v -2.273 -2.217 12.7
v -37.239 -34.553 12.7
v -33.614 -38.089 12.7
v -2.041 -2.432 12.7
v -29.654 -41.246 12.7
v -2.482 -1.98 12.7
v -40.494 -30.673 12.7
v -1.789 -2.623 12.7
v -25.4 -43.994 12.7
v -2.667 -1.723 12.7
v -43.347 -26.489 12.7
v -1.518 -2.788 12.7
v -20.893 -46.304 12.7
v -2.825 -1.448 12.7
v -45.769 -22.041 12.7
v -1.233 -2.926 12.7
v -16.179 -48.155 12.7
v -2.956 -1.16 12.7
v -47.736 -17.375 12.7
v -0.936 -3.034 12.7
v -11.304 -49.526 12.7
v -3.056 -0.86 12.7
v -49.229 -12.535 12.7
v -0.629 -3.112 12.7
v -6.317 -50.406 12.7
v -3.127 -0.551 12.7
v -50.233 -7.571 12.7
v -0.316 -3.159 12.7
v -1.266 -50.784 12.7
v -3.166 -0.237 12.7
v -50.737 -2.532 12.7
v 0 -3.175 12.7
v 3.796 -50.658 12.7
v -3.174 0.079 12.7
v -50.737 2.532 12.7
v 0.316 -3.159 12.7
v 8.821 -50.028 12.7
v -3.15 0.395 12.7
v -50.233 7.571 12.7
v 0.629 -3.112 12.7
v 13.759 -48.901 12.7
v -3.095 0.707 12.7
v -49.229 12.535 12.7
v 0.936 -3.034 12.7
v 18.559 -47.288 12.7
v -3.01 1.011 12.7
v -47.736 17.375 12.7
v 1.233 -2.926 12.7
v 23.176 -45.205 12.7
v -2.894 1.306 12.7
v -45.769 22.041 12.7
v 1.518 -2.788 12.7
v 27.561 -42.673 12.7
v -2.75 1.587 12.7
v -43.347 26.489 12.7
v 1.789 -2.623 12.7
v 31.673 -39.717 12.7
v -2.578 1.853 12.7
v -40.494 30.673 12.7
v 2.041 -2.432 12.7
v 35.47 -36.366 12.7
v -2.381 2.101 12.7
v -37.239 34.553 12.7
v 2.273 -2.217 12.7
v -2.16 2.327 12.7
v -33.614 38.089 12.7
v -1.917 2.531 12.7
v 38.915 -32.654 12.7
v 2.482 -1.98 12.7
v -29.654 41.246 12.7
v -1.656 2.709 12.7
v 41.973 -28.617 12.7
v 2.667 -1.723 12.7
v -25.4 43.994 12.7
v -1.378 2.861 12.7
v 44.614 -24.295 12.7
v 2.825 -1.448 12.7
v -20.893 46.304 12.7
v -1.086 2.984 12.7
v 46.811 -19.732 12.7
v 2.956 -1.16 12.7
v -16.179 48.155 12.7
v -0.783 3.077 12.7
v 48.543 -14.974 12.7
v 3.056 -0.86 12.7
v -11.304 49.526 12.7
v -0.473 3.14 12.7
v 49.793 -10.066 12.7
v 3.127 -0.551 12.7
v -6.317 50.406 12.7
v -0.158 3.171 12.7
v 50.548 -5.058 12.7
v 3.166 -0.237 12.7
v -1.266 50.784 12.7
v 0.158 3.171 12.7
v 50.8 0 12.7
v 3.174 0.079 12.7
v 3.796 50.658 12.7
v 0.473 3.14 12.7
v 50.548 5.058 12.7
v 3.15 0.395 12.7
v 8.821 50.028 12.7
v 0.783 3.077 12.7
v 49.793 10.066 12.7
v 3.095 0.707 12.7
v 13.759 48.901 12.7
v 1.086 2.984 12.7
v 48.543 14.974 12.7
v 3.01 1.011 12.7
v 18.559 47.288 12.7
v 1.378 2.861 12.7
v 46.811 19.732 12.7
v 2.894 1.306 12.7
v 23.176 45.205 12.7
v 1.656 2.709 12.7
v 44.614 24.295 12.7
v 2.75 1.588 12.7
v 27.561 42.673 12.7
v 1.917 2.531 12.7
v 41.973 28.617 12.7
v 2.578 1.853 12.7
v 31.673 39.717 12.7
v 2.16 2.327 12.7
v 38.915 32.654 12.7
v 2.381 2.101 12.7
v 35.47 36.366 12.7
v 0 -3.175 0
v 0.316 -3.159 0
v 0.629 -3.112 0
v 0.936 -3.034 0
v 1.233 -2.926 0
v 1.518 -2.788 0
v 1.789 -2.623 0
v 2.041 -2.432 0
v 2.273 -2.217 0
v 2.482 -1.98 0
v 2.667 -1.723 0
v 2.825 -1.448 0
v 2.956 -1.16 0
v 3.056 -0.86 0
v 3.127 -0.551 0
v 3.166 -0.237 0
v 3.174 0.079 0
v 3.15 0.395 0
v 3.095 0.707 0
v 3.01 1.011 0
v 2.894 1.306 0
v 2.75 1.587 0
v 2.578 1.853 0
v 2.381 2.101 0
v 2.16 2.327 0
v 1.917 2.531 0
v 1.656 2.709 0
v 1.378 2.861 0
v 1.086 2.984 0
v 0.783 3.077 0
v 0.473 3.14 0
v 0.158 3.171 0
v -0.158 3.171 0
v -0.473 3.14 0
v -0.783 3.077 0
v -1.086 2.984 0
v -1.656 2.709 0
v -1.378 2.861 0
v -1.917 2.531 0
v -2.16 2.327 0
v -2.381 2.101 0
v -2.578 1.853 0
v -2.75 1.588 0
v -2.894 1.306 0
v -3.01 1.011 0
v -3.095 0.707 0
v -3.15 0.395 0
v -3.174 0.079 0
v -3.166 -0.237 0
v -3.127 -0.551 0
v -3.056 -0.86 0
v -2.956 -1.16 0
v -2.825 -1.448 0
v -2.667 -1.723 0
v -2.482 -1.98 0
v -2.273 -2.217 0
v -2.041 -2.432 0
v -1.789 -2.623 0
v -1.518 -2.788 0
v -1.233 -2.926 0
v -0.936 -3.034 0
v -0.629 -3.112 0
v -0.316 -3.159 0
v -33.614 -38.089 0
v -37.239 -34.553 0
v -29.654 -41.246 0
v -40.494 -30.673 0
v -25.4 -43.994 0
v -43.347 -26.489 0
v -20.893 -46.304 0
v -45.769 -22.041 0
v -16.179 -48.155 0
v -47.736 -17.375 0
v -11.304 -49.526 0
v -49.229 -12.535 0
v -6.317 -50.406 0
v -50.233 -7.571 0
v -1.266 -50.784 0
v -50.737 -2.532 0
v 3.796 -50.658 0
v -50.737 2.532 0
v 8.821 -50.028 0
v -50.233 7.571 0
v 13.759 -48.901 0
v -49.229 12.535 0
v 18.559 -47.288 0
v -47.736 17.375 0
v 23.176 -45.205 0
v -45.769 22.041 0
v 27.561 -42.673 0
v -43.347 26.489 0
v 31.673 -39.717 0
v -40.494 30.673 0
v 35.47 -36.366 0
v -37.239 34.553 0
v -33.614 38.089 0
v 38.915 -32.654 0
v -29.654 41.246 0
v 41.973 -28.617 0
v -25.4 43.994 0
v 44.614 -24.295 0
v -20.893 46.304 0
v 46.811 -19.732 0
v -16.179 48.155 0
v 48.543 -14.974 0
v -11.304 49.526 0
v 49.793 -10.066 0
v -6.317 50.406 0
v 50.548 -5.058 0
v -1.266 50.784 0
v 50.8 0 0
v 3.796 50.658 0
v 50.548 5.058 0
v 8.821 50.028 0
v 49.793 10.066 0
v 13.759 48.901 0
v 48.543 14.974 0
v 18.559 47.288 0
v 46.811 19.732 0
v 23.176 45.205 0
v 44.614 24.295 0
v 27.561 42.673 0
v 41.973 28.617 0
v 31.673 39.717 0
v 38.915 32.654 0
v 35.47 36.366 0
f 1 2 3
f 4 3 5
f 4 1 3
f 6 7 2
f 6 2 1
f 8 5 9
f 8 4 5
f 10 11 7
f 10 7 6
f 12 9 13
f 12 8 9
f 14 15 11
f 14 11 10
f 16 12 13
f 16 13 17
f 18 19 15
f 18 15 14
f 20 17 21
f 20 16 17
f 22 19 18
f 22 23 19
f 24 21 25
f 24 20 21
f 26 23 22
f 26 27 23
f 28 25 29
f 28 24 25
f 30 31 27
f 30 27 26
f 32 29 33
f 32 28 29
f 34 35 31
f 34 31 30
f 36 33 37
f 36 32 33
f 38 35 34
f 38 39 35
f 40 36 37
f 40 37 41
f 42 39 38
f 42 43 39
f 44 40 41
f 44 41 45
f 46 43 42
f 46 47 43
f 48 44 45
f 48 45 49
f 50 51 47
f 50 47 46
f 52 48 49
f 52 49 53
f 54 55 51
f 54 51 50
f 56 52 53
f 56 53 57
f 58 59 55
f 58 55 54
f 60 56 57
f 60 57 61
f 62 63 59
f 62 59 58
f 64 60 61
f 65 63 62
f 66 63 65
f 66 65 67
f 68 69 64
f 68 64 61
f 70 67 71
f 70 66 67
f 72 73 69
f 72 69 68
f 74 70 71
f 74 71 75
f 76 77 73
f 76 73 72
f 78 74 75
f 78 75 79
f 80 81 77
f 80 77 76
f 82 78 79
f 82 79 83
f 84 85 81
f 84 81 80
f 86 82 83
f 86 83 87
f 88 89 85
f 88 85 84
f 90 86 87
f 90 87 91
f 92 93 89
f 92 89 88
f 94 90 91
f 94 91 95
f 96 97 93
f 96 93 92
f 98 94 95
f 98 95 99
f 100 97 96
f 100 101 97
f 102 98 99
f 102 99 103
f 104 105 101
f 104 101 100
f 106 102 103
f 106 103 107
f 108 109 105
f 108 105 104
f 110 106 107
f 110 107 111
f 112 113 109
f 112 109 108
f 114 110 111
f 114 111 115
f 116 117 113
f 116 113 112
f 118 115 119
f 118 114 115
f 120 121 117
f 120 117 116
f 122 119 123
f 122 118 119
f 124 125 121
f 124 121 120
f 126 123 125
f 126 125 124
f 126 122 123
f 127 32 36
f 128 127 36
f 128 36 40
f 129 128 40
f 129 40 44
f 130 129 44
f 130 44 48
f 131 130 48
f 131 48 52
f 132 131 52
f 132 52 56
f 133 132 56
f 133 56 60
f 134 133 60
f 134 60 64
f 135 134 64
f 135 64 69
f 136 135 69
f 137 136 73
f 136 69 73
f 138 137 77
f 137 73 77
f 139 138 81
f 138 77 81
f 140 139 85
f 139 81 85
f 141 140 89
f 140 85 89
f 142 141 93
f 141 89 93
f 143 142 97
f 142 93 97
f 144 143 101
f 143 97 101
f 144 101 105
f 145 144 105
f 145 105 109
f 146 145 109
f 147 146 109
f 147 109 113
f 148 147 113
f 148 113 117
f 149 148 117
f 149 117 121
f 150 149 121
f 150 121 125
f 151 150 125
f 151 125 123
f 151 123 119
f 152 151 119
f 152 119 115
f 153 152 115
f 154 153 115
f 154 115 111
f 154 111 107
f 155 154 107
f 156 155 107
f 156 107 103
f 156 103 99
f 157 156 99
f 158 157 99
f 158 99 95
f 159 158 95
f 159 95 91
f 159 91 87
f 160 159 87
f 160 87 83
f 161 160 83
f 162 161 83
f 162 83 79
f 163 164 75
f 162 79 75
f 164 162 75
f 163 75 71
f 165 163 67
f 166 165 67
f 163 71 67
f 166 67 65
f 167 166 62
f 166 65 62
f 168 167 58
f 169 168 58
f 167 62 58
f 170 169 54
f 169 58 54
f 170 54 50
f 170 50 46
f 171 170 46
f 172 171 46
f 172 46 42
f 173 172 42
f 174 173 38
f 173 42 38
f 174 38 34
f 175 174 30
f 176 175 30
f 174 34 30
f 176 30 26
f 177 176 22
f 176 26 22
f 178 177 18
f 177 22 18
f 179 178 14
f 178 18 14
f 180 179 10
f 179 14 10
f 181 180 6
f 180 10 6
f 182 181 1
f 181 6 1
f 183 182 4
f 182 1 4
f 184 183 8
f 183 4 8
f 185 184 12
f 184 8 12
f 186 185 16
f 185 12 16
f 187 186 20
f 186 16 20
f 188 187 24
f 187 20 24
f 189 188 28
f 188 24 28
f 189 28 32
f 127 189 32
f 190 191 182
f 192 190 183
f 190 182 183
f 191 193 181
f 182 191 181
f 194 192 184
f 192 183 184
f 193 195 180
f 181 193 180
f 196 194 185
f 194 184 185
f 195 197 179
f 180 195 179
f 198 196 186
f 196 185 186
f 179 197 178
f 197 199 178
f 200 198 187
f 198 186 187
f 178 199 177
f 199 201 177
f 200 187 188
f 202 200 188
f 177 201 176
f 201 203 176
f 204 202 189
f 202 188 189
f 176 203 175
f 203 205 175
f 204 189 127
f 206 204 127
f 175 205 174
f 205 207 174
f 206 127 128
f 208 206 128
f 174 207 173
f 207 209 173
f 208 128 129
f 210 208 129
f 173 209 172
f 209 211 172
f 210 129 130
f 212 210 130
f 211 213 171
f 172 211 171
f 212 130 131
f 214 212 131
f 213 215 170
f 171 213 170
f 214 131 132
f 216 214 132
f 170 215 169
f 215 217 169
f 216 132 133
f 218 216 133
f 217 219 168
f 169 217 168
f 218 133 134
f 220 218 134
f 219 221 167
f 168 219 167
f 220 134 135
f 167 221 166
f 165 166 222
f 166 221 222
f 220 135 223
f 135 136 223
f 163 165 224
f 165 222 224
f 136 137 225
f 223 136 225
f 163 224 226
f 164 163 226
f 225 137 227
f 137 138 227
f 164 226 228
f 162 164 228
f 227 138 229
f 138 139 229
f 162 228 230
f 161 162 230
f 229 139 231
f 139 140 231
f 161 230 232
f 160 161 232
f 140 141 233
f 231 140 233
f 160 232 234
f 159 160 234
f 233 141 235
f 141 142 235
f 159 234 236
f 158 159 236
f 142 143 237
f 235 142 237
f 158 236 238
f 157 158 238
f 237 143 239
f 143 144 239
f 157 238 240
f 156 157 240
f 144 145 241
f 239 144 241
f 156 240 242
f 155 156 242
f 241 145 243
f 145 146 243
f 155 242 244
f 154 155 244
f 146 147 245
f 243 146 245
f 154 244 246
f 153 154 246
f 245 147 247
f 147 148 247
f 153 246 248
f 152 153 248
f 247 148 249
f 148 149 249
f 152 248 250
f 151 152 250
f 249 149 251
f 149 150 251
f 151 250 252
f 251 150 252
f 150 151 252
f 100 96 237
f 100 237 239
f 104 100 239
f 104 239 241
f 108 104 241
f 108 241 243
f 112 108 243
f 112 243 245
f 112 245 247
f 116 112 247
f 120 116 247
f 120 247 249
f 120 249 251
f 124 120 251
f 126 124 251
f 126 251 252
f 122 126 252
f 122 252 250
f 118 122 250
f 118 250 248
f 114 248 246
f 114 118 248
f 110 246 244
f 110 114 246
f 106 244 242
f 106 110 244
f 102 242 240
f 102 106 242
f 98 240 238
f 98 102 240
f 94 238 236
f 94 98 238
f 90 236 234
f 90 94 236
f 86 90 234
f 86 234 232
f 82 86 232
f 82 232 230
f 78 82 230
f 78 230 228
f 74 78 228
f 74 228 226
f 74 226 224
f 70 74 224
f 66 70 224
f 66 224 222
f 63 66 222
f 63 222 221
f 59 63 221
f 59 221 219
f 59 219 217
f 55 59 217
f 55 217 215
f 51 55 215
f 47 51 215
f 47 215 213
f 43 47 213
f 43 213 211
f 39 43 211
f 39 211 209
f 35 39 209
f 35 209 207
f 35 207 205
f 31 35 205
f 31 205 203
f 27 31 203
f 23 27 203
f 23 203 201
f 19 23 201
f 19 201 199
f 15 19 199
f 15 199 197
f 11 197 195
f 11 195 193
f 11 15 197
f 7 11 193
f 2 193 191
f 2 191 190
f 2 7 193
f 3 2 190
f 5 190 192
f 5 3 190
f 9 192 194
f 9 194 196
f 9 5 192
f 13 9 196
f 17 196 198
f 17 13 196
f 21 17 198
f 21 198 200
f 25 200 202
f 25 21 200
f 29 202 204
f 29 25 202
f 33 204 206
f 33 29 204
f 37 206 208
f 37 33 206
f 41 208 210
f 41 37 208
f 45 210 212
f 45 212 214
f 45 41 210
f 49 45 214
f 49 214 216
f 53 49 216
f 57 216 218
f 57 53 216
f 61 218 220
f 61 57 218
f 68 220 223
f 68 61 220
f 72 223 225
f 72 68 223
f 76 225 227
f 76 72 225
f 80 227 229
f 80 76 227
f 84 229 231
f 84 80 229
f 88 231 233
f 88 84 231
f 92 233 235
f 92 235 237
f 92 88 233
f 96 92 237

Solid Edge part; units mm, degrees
sketch "Sketch1" plane through (0, 0, 0) normal (0, 0, 1) x (1, 0, 0)
  circle A0 centre (0, 0) radius 47.625
extrude "Protrusion1" add sketch "Sketch1" along normal blind 12.7
sketch "Sketch2" plane through (0, 0, 12.7) normal (0, 0, 1) x (1, 0, 0)
  circle A0 centre (0, 0) radius 50.8
  circle A1 centre (0, 0) radius 47.625
extrude "ExtrudedProtrusion_3" add sketch "Sketch2" against normal blind 12.7
hole "Hole_1" at (0, 0, 12.7) direction (0, 0, -1) diameter 6.35 end up to next
properties part number "SPaRC - 01 - 002"
